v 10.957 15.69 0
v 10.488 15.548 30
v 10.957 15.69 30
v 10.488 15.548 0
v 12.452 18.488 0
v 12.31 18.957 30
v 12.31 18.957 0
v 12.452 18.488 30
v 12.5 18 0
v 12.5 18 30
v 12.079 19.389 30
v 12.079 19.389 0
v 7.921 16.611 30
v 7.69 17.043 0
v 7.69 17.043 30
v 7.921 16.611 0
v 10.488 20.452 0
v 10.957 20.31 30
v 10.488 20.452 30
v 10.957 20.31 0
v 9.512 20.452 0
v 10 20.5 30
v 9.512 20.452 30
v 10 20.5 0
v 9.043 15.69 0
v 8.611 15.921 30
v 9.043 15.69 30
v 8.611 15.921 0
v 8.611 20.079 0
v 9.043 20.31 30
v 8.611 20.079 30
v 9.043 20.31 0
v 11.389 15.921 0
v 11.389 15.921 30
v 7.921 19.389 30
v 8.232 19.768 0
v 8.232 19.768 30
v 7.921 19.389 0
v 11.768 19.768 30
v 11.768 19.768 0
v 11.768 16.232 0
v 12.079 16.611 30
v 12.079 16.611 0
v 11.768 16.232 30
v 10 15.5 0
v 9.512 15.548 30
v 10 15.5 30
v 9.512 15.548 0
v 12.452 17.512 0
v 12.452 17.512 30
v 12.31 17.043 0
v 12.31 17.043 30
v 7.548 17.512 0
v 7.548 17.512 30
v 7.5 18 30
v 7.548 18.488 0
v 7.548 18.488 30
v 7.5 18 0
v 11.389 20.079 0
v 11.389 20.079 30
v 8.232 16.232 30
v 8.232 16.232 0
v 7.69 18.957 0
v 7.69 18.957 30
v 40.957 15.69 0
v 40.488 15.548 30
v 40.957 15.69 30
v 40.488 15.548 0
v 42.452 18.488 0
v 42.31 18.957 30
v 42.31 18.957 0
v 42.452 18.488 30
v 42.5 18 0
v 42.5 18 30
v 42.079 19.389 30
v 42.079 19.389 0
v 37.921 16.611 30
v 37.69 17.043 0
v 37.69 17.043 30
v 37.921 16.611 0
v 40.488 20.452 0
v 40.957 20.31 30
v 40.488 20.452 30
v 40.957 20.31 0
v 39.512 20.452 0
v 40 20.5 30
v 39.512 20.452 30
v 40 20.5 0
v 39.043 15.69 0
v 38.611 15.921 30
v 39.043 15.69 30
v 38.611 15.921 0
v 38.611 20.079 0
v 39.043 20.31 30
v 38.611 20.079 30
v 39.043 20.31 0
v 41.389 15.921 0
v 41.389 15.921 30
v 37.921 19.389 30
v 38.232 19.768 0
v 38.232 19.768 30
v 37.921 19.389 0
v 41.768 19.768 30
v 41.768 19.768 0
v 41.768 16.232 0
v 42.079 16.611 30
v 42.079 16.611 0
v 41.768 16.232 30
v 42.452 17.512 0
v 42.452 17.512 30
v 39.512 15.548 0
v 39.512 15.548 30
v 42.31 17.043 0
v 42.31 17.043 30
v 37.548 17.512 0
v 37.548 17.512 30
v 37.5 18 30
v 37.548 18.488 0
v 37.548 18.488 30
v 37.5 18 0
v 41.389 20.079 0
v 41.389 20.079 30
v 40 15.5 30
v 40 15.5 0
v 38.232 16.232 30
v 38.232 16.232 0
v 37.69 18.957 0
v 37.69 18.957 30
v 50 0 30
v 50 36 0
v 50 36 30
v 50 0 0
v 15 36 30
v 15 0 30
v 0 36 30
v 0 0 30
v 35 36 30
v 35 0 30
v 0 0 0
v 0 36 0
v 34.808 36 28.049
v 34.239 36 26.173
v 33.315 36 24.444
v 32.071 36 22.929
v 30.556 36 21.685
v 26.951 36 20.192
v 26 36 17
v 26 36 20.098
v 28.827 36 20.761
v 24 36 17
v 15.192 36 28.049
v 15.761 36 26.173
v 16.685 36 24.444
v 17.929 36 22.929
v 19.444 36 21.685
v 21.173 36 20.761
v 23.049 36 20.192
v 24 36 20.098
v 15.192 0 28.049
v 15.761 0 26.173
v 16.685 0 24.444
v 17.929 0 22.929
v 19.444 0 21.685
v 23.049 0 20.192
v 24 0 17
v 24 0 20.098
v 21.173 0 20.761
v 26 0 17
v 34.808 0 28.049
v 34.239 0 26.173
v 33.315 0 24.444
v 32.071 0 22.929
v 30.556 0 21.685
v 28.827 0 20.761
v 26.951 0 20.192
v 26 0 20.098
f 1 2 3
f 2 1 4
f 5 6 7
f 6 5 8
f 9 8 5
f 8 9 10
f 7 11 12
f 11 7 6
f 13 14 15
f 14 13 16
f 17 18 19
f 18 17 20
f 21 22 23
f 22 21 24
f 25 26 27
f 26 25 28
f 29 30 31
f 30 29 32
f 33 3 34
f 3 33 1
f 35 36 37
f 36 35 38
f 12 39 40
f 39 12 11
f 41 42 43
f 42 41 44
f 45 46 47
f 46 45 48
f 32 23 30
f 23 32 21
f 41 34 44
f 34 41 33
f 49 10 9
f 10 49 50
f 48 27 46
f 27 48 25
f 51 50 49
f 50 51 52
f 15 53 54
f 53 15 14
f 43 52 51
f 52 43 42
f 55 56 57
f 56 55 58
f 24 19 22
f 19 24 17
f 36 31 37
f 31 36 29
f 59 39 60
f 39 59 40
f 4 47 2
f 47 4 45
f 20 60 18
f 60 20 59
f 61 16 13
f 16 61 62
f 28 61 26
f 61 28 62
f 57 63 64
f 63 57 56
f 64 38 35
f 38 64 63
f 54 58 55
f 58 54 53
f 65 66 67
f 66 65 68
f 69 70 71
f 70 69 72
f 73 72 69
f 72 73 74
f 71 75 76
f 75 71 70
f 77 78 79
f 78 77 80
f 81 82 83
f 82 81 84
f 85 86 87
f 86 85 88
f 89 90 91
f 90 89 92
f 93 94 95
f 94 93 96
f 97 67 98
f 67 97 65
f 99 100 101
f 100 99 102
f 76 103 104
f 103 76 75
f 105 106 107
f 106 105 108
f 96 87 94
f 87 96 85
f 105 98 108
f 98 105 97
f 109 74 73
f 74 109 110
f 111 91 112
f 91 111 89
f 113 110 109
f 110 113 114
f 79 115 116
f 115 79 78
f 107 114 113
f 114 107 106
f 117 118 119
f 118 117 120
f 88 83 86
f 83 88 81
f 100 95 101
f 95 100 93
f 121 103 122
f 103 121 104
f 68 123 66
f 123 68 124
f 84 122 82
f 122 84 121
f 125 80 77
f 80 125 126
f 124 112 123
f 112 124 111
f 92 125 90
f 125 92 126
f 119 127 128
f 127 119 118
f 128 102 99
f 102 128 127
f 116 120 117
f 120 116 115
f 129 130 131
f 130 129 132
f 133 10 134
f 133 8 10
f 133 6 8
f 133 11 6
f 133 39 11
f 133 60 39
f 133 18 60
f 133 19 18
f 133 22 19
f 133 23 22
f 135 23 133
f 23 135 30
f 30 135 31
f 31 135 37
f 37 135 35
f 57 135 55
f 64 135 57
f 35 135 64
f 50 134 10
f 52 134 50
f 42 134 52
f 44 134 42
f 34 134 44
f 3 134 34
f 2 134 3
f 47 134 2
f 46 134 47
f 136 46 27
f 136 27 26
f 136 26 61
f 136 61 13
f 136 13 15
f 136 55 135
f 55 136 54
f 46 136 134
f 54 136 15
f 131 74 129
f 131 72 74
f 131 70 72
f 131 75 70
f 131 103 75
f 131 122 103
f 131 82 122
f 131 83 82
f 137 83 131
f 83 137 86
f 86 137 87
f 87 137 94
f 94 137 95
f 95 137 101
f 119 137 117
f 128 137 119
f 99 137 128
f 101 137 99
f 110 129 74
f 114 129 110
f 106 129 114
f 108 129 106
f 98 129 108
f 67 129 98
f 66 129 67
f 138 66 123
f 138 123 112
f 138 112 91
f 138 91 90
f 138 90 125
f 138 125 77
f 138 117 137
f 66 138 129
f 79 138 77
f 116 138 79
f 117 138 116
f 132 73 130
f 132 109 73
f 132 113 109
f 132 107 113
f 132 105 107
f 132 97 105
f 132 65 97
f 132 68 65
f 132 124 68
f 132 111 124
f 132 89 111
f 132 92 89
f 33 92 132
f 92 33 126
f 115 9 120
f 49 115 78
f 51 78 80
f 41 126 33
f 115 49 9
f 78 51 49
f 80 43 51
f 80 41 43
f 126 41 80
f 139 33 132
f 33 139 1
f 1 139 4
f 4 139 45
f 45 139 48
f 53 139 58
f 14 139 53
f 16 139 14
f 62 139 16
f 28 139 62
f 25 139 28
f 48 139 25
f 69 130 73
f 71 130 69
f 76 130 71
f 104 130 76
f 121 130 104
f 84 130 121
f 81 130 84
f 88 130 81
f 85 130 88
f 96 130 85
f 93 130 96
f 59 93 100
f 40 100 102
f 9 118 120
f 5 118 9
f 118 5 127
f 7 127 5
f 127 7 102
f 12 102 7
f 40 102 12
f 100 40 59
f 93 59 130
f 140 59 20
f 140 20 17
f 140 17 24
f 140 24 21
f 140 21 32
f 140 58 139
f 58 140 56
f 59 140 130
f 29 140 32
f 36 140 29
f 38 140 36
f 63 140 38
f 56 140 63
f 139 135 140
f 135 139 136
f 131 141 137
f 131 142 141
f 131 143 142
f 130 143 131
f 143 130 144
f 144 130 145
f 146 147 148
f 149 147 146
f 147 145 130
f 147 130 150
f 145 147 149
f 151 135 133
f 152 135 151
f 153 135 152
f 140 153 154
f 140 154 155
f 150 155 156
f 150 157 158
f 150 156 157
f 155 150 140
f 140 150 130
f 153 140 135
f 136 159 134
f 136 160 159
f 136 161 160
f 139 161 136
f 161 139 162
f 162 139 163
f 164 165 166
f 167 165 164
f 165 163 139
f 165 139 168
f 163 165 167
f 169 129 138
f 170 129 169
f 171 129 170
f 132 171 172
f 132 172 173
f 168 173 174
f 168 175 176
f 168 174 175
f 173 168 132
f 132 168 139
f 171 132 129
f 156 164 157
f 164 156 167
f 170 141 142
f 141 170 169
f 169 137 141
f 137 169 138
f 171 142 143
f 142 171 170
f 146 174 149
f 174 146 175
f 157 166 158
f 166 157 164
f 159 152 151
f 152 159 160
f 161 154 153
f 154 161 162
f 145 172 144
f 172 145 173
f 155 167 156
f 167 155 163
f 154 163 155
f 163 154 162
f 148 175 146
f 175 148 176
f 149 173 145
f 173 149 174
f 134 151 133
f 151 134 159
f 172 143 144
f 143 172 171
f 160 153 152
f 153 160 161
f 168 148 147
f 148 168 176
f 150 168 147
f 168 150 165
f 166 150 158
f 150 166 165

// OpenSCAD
$fn = 32;

// ----------------------------------------------------------------------
// Saddle clamp: split shaft clamp
// ----------------------------------------------------------------------

// --- parameters (mm) ---
blk_l = 50;               // block length, X
blk_w = 36;               // block width, Y
blk_h = 30;               // block height
clamp_r = 10;             // shaft groove radius
hole_r = 2.5;             // bolt hole radius
hole_m = 10;              // bolt hole margin from the ends
saw_w = 2;                // saw kerf width

saw_depth = clamp_r + 3;  // saw kerf depth

difference() {
  cube([blk_l, blk_w, blk_h]);
  translate([blk_l / 2, -1, blk_h])
    rotate([-90, 0, 0])
      cylinder(h = blk_w + 2, r = clamp_r);
  for (sx = [0, 1])
    translate([sx ? blk_l - hole_m : hole_m, blk_w / 2, -1])
      cylinder(r = hole_r, h = blk_h + 2);
  translate([blk_l / 2 - saw_w / 2, -1, blk_h - saw_depth])
    cube([saw_w, blk_w + 2, saw_depth + 1]);
}
